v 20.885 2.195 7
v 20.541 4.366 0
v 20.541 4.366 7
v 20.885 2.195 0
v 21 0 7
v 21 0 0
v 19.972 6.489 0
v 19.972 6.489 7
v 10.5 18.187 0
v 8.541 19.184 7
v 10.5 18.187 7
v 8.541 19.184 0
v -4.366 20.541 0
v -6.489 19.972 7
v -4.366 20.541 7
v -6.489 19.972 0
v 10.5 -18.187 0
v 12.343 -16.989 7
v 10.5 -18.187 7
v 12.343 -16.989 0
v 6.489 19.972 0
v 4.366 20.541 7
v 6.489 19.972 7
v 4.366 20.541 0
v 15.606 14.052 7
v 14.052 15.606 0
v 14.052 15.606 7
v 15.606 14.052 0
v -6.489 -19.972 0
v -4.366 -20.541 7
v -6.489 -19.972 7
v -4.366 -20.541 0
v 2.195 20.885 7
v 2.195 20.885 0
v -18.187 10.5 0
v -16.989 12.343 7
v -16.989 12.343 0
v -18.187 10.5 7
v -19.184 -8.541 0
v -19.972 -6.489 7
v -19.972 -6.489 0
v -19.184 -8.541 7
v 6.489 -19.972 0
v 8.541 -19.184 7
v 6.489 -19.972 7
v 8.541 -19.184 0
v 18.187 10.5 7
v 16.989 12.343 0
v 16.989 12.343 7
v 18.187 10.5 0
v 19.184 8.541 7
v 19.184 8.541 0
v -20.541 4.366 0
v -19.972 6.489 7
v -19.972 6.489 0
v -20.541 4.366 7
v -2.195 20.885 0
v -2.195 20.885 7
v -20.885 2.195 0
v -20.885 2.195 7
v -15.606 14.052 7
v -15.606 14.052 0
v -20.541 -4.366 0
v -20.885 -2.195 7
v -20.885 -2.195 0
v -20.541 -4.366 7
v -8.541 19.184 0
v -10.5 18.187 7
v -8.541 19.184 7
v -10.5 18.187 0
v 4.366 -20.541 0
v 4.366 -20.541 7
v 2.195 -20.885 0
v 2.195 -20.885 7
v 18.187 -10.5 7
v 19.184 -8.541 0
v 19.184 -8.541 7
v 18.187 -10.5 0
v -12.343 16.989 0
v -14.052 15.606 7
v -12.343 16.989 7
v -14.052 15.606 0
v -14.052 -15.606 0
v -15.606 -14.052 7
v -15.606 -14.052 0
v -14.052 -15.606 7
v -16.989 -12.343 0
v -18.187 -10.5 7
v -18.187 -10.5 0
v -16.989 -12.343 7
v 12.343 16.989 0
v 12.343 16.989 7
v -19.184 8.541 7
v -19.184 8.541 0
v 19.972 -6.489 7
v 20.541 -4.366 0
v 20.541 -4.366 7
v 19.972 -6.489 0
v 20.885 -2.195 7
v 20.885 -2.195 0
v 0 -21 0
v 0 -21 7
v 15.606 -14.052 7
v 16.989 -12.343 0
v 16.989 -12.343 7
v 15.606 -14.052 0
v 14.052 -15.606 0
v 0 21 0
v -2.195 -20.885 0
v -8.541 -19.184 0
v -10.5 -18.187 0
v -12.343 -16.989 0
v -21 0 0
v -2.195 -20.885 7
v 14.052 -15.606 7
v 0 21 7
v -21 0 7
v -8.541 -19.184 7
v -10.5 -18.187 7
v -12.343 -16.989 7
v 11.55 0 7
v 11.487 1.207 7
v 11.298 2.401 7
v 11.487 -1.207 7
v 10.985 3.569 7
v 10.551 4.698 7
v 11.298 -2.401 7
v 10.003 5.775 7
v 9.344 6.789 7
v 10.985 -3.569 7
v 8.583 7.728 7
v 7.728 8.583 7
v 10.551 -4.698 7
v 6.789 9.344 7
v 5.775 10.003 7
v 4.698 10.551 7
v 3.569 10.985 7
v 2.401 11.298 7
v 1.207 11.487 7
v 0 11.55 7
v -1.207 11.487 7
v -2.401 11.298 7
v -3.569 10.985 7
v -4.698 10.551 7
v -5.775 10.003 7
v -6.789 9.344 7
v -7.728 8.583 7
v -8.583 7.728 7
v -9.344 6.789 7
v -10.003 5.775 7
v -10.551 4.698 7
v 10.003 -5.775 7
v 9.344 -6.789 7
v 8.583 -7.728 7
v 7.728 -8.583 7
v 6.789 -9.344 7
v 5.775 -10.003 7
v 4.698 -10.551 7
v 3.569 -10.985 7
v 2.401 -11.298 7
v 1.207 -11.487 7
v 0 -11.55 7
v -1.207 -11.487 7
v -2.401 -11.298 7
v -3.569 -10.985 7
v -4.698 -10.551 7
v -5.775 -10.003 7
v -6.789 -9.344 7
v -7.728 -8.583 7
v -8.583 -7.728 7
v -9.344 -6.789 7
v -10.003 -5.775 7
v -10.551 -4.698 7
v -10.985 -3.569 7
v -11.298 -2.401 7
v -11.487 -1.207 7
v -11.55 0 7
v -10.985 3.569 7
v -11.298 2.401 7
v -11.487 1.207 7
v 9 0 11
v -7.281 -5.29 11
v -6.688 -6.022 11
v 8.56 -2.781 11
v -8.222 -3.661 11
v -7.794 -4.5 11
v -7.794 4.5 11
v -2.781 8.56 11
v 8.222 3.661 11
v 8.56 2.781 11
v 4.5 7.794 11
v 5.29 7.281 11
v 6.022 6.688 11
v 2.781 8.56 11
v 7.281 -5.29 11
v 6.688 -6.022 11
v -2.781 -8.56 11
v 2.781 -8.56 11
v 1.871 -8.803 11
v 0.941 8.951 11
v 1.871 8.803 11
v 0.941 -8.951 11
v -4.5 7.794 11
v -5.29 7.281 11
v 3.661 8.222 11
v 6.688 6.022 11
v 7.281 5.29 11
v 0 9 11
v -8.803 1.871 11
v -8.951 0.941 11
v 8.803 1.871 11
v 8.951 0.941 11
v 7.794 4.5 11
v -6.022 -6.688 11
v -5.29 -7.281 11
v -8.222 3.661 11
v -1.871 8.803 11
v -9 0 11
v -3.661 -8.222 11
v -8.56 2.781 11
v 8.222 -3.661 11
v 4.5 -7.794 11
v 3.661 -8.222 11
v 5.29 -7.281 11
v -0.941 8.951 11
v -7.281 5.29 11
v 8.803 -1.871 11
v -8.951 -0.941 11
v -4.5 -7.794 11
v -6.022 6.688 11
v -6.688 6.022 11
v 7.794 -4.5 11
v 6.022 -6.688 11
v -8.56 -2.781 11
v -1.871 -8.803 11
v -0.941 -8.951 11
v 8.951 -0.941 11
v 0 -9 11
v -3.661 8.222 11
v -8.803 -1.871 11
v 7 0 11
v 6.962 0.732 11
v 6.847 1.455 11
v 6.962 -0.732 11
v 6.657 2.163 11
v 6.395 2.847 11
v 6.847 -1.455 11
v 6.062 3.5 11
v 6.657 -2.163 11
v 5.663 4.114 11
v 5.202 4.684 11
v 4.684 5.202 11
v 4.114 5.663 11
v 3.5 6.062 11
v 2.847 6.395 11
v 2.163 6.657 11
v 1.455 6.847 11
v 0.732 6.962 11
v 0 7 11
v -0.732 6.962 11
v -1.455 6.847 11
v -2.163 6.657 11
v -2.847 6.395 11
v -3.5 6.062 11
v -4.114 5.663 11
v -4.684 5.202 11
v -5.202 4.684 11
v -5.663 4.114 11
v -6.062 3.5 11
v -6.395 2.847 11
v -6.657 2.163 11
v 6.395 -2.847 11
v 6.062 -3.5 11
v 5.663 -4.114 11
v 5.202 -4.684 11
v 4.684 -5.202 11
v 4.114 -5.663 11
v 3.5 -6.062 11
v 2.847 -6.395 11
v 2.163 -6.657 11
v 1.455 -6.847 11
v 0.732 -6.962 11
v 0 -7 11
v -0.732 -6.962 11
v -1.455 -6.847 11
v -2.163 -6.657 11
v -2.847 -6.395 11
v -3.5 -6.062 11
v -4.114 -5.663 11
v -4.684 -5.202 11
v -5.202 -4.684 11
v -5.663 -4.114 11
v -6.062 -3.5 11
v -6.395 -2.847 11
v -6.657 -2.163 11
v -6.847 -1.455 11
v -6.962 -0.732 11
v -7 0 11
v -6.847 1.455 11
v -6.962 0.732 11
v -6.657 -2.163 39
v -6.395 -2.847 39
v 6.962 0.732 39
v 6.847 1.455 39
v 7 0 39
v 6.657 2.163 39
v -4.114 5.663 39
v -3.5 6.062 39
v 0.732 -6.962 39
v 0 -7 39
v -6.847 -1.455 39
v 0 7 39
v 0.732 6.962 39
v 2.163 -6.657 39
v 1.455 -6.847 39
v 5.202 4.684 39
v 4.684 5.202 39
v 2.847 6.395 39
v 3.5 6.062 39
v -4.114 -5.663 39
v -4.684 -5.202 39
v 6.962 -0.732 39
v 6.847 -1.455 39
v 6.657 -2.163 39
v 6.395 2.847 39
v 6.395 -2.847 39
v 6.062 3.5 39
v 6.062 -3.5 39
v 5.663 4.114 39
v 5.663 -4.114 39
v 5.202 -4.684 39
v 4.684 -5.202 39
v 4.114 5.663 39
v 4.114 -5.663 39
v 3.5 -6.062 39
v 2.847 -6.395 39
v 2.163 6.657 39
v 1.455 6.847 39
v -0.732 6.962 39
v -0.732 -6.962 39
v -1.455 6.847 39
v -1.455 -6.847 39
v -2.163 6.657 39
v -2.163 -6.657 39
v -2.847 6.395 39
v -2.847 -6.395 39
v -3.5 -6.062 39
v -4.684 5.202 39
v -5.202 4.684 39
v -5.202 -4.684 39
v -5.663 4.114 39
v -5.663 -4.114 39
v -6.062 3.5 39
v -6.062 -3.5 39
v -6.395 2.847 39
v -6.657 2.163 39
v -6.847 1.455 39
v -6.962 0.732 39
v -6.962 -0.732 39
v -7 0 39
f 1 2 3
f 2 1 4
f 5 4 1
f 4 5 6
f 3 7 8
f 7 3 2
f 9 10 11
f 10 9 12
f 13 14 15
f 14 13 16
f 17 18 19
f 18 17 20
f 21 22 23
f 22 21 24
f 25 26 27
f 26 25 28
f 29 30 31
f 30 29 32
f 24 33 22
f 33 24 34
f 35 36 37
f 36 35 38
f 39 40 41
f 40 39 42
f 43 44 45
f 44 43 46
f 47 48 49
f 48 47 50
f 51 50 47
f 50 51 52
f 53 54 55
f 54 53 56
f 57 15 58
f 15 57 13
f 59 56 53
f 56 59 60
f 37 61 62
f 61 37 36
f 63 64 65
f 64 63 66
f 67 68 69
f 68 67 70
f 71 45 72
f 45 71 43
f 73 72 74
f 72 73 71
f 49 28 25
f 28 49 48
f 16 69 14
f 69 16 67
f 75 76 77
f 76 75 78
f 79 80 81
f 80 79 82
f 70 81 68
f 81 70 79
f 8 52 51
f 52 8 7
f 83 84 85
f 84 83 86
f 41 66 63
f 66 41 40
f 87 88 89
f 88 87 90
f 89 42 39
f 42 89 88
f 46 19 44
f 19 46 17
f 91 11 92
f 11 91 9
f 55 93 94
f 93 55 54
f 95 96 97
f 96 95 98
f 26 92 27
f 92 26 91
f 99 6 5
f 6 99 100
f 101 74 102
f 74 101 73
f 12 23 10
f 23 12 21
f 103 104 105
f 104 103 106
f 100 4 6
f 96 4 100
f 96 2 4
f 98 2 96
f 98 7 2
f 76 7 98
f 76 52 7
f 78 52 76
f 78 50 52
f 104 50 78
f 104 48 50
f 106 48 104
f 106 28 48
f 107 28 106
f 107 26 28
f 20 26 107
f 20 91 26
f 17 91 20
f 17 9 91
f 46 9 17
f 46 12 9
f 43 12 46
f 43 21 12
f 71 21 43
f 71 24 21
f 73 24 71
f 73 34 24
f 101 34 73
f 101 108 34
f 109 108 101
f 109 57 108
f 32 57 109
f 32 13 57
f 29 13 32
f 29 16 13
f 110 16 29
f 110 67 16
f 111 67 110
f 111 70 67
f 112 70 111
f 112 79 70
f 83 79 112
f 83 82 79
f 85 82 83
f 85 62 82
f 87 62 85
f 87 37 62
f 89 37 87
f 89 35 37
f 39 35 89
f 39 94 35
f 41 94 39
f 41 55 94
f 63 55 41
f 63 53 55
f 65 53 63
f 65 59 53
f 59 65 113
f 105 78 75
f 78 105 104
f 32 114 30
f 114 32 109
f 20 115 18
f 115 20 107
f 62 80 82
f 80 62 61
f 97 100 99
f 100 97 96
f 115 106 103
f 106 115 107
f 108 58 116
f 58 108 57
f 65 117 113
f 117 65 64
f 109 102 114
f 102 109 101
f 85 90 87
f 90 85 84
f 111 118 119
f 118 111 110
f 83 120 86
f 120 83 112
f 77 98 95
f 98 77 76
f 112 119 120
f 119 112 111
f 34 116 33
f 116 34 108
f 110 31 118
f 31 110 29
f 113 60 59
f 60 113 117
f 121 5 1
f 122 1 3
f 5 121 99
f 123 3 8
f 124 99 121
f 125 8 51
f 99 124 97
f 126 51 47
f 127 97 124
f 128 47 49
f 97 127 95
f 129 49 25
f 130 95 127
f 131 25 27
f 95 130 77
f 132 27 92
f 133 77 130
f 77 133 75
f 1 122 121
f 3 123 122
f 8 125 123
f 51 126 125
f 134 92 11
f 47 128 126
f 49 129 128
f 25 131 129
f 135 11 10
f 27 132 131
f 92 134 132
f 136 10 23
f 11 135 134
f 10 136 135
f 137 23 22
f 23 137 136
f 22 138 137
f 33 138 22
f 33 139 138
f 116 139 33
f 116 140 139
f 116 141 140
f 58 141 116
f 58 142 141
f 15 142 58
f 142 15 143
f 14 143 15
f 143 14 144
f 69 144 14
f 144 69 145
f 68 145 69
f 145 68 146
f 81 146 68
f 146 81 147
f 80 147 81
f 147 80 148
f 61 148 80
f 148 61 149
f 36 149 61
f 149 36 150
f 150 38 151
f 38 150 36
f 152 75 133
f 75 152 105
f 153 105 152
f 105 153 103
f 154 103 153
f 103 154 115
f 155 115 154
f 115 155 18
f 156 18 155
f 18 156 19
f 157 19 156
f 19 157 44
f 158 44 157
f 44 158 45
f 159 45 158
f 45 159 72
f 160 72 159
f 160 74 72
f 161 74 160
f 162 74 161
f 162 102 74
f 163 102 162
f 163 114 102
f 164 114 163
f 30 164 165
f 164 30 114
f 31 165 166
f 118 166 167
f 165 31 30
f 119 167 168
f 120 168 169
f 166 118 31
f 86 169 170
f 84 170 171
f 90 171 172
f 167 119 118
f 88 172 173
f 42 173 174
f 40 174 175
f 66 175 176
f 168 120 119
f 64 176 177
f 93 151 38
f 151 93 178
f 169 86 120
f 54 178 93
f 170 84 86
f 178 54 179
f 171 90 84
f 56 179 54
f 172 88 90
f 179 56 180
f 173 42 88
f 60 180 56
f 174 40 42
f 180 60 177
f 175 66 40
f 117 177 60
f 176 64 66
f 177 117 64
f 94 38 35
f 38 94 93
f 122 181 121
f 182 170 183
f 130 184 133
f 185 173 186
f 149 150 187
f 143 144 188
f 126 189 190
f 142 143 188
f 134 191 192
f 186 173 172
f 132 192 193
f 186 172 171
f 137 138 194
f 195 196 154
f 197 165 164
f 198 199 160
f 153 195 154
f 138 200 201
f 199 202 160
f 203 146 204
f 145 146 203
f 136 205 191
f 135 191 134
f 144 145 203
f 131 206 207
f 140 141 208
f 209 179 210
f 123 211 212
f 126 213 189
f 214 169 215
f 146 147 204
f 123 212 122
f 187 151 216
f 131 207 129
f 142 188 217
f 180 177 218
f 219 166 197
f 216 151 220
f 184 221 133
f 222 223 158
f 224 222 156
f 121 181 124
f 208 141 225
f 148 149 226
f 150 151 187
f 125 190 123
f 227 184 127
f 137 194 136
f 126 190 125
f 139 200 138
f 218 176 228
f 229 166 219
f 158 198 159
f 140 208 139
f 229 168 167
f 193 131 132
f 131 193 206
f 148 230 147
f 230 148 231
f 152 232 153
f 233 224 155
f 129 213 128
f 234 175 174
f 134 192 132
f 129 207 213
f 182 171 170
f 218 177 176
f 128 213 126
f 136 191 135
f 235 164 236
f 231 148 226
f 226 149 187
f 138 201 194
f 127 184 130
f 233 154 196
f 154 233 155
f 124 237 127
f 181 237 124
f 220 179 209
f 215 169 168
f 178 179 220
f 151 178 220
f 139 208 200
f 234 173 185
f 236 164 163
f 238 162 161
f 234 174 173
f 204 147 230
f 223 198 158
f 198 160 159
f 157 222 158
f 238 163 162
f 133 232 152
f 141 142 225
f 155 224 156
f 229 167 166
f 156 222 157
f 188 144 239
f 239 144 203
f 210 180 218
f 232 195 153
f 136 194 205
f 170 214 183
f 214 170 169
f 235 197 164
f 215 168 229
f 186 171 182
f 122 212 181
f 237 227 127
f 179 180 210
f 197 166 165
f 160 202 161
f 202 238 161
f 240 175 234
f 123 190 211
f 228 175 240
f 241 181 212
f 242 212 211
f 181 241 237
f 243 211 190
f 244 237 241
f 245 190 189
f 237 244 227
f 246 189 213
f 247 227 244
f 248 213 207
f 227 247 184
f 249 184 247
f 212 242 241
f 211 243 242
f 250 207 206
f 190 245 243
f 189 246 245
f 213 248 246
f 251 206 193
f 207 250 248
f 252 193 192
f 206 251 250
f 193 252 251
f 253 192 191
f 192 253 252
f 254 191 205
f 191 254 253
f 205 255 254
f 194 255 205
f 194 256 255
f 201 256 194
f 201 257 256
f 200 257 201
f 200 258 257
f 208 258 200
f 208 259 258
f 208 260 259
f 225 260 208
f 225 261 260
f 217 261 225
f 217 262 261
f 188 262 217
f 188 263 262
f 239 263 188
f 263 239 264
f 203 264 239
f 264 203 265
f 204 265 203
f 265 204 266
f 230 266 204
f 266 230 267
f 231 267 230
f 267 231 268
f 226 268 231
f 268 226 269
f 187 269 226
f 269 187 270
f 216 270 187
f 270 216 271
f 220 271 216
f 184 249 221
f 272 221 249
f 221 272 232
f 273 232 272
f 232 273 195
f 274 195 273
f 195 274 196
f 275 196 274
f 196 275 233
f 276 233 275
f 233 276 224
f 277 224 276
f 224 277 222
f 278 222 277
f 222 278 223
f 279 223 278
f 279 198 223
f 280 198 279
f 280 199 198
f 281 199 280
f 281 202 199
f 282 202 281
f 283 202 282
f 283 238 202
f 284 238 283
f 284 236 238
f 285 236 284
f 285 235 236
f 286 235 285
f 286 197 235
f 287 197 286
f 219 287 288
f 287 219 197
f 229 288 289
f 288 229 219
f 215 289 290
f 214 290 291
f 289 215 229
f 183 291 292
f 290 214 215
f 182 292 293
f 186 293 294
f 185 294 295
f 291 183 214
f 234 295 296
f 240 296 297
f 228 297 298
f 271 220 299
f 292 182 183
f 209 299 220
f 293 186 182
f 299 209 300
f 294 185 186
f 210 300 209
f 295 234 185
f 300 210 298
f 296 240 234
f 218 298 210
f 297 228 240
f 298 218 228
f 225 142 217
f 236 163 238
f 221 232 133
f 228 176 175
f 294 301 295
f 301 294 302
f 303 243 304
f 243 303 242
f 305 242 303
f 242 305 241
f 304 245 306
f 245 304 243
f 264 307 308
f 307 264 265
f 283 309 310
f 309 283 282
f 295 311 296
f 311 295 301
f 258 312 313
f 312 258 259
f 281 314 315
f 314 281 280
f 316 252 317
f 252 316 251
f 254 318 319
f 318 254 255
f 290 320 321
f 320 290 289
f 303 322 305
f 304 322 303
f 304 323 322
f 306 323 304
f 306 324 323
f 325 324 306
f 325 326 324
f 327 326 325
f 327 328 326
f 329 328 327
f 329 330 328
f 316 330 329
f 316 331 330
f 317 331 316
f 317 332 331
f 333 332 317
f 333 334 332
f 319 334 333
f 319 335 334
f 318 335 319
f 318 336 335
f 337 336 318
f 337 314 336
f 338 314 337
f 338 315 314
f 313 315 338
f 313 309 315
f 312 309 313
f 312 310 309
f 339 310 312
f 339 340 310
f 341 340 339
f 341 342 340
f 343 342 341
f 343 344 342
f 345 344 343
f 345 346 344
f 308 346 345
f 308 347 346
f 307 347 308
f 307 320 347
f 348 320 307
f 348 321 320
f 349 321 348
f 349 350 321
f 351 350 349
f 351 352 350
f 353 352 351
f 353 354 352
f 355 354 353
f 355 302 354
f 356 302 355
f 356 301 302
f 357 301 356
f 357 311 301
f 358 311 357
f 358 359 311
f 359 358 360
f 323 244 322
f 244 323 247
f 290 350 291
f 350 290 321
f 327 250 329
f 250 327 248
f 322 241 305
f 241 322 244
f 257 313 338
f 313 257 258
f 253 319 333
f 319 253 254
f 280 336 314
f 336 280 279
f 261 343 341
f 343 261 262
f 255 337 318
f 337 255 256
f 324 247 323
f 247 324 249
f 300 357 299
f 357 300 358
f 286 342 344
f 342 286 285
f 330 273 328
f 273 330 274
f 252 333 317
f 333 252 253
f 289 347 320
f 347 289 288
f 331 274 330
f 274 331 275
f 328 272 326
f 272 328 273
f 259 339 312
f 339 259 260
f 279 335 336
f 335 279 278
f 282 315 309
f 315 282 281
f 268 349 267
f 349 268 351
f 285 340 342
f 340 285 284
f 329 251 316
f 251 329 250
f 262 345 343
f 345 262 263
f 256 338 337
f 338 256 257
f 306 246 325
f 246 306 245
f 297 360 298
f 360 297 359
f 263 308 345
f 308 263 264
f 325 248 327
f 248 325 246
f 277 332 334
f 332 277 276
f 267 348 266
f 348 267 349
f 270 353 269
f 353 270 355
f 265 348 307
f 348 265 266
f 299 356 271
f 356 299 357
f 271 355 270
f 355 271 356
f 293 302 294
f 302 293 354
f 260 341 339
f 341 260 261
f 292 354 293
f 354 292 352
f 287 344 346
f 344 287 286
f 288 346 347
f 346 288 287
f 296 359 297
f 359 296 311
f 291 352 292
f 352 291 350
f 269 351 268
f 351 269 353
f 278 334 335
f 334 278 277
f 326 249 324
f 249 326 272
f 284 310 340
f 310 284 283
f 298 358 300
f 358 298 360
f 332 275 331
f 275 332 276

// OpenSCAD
// Adjustable leveling foot, smooth threaded-shaft representation.
$fn = 60;
eps = 0.02;
shaft_d = 14;
pad_d = 42;
shaft_l = 28;
pad_h = 7;
union() {
    cylinder(d = pad_d, h = pad_h);
    translate([0, 0, pad_h]) cylinder(d1 = pad_d * 0.55, d2 = shaft_d + 4, h = 4);
    translate([0, 0, pad_h + 4]) cylinder(d = shaft_d, h = shaft_l);
}
